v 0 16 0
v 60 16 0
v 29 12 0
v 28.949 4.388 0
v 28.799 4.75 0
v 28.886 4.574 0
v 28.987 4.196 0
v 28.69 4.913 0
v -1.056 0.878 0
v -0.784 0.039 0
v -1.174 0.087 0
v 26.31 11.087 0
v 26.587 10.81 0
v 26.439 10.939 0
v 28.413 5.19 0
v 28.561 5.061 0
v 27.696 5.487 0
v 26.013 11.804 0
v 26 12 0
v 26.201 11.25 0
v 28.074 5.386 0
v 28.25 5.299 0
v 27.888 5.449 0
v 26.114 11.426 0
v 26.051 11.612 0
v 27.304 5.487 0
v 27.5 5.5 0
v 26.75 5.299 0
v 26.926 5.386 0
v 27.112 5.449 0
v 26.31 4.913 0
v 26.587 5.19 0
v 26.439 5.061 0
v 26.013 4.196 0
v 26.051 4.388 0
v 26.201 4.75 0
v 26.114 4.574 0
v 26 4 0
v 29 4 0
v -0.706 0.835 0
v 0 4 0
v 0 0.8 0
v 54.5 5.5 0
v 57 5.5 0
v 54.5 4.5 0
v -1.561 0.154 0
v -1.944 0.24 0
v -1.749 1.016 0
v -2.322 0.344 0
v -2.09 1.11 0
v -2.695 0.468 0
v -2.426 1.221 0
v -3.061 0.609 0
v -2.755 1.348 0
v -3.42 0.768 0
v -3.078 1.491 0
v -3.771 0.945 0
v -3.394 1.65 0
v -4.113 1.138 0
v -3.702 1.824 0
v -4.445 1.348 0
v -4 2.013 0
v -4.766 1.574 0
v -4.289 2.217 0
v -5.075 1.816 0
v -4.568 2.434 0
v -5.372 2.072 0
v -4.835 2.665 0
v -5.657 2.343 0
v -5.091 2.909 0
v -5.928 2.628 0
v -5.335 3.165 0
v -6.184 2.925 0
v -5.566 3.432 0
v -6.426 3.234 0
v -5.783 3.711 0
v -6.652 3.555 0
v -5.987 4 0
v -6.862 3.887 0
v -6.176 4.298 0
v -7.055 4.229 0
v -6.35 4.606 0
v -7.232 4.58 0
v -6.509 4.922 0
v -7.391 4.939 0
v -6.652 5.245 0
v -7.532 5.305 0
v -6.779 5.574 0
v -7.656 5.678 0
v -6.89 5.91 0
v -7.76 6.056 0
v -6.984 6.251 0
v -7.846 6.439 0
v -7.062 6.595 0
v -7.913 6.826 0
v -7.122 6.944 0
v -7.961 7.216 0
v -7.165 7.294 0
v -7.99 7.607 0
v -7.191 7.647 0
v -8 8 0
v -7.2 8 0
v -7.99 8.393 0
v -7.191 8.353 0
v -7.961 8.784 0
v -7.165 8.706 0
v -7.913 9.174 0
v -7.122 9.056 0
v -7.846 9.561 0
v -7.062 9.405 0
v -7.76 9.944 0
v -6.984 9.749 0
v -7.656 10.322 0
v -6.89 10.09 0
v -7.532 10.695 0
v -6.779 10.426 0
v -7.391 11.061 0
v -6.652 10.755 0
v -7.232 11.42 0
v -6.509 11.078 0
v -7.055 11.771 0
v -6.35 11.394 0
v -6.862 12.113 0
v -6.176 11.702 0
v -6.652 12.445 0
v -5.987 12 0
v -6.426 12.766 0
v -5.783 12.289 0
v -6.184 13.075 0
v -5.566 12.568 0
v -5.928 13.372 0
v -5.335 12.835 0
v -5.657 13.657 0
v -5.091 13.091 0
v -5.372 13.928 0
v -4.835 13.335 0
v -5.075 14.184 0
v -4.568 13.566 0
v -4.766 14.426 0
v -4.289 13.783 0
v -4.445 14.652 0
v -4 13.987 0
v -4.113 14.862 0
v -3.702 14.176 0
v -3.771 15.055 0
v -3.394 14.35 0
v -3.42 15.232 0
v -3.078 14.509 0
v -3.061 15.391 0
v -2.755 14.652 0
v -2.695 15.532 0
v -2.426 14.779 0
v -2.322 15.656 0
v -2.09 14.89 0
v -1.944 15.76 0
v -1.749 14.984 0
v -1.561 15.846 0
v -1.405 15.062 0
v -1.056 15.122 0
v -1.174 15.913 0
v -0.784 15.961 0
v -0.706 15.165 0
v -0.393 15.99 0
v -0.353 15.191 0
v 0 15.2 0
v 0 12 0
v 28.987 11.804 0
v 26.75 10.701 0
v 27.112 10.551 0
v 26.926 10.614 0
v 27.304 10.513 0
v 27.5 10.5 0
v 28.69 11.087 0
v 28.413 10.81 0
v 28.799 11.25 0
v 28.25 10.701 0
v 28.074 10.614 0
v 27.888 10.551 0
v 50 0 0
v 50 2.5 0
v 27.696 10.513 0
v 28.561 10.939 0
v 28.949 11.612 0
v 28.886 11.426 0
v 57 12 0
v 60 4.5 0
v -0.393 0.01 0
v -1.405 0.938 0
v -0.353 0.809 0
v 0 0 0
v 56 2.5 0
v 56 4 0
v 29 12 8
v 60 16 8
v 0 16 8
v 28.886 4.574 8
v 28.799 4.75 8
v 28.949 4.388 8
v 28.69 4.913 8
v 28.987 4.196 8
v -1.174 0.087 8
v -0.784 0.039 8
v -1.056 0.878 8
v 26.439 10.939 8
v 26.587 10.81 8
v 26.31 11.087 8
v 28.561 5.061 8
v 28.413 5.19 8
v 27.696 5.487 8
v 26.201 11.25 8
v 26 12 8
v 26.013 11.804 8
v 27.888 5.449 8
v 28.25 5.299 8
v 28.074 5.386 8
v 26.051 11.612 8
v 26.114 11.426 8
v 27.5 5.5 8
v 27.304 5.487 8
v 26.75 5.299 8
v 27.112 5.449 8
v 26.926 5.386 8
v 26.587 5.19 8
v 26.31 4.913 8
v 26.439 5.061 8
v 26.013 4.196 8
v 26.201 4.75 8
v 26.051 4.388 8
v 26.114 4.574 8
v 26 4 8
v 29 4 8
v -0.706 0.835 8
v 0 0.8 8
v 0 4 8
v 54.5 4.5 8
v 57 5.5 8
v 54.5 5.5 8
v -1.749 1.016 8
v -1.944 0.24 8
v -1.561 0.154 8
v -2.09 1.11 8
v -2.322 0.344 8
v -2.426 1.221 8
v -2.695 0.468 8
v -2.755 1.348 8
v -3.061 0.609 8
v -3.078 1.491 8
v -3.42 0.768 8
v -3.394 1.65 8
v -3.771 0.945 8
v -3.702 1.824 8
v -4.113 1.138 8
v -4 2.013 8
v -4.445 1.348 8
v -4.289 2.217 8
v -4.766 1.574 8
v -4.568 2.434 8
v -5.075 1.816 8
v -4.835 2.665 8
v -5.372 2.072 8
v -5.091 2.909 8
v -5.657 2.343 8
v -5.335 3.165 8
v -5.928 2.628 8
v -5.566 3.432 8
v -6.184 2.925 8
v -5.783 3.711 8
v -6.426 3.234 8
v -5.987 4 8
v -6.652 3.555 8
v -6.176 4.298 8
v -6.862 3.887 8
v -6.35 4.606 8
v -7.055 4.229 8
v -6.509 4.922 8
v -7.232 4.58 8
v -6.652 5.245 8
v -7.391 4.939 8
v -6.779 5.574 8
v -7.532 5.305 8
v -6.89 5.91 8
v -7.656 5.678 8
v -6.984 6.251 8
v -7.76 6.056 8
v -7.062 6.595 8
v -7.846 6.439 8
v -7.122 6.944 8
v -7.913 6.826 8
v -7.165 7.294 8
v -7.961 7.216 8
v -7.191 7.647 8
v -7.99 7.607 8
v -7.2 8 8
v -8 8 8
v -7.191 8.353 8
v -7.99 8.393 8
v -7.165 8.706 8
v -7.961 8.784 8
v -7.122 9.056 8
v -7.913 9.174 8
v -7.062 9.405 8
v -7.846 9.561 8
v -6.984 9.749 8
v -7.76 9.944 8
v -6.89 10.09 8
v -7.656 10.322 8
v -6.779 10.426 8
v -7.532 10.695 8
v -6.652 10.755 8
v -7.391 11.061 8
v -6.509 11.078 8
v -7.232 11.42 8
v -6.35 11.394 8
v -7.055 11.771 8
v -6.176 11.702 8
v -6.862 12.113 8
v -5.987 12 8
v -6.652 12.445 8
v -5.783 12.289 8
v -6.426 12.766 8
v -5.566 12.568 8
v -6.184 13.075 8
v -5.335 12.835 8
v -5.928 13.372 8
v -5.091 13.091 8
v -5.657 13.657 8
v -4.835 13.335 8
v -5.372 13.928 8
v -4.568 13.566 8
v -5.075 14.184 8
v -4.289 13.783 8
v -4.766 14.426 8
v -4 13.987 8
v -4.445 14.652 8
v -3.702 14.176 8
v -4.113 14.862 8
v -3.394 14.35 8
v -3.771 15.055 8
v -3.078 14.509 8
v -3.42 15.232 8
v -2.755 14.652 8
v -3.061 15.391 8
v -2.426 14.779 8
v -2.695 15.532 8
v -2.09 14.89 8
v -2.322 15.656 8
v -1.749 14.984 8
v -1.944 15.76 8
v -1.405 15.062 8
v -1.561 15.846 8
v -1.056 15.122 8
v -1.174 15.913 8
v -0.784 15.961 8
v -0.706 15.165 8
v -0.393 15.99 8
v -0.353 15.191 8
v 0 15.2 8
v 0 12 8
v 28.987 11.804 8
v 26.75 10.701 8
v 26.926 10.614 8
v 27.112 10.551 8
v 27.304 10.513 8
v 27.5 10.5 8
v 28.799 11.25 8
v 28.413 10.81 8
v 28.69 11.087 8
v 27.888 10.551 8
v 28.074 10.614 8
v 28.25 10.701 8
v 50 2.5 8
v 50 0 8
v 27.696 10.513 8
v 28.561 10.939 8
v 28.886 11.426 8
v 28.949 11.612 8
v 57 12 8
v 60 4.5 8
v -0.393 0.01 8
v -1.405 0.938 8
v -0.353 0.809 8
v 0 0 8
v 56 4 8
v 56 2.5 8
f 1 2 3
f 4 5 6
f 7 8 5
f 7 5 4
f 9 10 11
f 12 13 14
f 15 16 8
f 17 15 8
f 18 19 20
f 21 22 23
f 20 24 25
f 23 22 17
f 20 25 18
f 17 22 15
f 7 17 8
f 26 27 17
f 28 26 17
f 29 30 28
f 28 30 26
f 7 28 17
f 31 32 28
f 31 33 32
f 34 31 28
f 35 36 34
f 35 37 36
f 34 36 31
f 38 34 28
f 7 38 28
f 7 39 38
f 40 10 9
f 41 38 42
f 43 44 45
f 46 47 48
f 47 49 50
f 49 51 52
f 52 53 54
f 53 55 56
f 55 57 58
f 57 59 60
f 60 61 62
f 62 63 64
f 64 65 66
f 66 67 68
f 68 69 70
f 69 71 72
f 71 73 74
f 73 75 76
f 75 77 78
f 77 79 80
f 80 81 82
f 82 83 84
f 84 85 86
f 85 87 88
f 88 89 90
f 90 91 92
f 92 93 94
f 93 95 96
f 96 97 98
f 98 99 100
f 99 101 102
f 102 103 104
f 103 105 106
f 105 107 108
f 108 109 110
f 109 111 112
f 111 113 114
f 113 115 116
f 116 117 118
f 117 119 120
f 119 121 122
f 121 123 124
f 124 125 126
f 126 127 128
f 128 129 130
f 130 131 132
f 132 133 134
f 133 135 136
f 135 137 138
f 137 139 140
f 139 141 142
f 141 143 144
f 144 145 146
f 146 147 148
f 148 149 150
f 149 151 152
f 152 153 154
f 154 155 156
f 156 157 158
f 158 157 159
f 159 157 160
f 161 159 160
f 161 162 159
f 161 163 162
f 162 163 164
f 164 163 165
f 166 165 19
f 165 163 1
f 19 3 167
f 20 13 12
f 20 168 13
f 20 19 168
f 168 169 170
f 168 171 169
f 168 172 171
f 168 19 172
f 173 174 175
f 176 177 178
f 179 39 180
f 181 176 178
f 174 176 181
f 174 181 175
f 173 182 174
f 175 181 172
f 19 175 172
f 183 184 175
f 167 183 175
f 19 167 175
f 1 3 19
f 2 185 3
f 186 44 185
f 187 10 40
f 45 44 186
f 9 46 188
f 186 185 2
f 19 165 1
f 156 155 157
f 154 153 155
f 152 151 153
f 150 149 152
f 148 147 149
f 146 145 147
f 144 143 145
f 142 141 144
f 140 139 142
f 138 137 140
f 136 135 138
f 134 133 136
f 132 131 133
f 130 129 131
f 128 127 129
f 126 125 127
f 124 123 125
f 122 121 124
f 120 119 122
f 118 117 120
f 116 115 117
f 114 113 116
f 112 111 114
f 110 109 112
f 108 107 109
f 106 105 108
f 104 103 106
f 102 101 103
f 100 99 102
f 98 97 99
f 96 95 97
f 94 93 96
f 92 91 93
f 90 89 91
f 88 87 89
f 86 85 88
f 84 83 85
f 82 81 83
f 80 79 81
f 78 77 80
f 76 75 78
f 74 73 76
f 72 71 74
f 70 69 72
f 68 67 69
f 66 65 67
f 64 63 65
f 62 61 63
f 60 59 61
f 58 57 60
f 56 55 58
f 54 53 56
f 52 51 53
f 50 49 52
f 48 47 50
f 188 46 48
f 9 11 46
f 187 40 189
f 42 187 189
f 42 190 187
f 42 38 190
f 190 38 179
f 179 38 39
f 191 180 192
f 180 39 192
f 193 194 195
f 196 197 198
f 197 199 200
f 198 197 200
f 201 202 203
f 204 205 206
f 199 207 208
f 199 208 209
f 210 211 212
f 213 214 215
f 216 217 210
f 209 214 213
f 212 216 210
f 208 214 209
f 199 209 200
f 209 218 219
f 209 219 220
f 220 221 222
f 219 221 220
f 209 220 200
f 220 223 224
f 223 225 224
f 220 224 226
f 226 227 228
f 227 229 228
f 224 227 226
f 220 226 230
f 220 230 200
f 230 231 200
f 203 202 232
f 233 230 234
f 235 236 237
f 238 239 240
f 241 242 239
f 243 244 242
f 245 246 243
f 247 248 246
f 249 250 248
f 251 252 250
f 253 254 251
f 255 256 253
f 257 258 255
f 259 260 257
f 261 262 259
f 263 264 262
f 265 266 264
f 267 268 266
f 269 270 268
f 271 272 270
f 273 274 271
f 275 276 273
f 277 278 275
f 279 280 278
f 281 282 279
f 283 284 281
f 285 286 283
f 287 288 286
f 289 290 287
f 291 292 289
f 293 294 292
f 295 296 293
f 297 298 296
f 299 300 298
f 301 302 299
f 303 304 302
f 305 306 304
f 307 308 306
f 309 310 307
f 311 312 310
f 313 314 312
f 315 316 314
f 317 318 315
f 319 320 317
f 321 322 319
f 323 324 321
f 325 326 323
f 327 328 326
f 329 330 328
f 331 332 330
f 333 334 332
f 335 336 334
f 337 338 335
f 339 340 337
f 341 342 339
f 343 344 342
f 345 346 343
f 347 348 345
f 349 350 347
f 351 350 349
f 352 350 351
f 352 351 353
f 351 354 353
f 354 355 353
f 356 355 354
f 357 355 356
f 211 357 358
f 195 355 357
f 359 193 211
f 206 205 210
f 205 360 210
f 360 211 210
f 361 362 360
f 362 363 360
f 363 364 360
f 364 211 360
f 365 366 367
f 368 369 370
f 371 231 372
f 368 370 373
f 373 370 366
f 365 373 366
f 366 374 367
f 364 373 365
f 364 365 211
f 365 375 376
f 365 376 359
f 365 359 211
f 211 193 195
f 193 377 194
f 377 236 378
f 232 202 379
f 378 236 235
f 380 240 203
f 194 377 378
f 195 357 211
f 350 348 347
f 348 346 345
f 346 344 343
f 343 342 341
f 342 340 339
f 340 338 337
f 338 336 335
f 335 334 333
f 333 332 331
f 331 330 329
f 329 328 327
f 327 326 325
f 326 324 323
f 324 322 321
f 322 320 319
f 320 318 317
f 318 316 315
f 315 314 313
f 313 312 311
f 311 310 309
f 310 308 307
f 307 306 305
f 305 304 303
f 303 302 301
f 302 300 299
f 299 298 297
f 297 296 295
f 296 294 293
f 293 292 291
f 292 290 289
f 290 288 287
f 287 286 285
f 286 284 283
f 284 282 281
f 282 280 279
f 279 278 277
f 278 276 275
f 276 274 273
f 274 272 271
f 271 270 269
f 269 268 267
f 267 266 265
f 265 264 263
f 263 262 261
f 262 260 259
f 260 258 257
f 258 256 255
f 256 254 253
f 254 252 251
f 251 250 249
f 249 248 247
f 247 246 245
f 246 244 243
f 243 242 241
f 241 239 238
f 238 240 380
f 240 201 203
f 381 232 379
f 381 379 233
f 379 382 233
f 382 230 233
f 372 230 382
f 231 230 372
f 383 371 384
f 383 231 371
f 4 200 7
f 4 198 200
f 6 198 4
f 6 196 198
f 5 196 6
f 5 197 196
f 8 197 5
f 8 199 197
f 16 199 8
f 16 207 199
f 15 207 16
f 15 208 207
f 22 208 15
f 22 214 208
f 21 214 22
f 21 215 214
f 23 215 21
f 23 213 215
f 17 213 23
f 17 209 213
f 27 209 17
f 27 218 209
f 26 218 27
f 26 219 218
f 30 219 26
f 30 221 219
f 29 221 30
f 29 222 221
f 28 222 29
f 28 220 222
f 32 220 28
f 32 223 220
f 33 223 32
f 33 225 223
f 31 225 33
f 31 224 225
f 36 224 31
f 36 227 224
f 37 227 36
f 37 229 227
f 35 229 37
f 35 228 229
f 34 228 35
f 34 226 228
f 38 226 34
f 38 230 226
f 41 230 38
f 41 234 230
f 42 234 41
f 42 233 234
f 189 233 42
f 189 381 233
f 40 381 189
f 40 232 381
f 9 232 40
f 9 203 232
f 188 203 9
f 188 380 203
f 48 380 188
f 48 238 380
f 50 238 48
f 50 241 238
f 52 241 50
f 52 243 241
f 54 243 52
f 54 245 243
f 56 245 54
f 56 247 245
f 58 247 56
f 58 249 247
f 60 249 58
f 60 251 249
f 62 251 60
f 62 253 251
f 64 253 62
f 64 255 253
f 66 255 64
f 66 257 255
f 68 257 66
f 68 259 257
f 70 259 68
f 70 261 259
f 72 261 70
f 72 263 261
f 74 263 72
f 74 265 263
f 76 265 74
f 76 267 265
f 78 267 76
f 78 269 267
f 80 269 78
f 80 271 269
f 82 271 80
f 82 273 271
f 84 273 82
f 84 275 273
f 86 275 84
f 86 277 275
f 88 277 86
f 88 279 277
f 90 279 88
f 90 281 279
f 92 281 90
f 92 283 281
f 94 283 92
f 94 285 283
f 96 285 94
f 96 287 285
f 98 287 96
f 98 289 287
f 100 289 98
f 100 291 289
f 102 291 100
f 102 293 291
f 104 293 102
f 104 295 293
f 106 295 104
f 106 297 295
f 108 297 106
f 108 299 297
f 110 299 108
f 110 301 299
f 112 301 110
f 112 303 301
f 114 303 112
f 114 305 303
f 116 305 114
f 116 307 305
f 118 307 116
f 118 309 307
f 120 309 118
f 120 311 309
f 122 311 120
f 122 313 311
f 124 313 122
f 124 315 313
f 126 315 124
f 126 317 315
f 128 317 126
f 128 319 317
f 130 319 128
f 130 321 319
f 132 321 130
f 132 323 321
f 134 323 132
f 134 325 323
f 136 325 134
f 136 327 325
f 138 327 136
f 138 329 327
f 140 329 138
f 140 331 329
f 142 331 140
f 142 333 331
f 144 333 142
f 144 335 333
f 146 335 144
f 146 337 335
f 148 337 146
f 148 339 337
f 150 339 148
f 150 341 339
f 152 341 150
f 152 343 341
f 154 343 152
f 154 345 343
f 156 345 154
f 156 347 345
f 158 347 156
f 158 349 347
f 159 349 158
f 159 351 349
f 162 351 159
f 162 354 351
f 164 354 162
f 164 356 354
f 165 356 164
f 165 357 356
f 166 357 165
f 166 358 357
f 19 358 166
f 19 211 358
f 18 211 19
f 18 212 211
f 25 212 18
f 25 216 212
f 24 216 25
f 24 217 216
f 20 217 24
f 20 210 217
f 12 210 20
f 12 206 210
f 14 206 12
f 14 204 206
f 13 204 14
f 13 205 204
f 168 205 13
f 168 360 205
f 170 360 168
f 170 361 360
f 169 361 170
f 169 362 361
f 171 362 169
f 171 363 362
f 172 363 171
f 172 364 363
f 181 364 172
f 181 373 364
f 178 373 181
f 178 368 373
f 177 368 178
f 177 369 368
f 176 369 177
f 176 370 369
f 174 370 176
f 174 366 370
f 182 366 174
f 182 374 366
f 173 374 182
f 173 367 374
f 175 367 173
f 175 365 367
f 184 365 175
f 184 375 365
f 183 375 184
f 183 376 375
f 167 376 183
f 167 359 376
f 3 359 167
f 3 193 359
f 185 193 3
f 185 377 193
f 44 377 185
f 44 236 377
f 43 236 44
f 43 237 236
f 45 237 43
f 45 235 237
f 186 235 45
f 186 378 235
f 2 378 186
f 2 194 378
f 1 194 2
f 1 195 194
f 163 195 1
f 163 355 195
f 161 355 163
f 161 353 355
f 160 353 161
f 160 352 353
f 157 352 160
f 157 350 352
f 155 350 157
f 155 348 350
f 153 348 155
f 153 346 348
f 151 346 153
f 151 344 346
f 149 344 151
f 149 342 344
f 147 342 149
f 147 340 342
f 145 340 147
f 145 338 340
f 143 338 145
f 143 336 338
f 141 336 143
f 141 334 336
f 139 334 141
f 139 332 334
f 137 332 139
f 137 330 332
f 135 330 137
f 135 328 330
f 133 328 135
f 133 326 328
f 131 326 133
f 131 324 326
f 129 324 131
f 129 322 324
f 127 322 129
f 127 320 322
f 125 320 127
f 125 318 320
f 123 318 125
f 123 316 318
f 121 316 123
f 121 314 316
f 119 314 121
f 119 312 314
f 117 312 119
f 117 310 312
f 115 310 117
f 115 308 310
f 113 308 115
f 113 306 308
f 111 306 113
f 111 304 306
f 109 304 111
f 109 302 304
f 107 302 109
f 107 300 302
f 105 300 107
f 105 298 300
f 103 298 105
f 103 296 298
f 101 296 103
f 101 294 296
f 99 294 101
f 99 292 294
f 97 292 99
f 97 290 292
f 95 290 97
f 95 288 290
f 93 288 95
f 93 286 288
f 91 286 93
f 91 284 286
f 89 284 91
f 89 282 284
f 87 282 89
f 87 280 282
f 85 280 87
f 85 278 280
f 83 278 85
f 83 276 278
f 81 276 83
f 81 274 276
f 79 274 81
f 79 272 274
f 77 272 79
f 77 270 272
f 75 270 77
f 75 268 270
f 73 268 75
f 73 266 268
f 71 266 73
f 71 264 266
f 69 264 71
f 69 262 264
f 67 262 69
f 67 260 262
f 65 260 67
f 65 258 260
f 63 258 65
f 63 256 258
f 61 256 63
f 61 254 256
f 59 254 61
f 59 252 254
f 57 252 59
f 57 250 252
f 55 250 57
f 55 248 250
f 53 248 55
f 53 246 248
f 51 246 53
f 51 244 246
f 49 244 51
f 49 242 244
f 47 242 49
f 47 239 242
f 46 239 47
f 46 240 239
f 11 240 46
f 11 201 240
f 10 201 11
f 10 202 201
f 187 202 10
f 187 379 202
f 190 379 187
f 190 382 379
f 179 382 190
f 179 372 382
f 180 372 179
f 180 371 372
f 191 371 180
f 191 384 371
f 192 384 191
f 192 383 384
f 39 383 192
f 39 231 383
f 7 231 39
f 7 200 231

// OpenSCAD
// Pinch clamp for silicone tubing (up to 6.4 mm OD) with a living hinge and a snap latch
// Category: quick fixes. One flat profile: two jaws joined by a 0.8 mm half-ring hinge, a
// half-round pinch ridge on each jaw, and a hook on the upper jaw whose nose snaps under the
// lower jaw's thin tongue when the jaws are squeezed together.
// Print: PETG or PP (PLA hinges crack), lying flat, 0.2 mm layers, 100 % infill.
// SPDX-License-Identifier: CERN-OHL-P-2.0

/* [Clamp] */
thickness = 8;            // extrusion along Z
lower_jaw = [50, 4];      // x 0..50, y 0..4
tongue = [50, 56, 2.5];   // x from, x to, y bottom (top at y = 4)
upper_jaw = [60, 12, 16]; // x 0..60, y 12..16
hinge_c = [0, 8];         // half-ring on the x < 0 side
hinge_r = [7.2, 8];       // inner, outer radius (0.8 mm thick)
ridge_x = 27.5;
ridge_r = 1.5;
leg = [57, 60, 4.5, 12];  // hook leg x from, x to, y from, y to
nose = [54.5, 57, 4.5, 5.5];

/* [Hidden] */
eps = 0.01;

linear_extrude(thickness) union() {
    square(lower_jaw);
    translate([tongue[0], tongue[2]]) square([tongue[1] - tongue[0], lower_jaw.y - tongue[2]]);
    translate([0, upper_jaw[1]]) square([upper_jaw[0], upper_jaw[2] - upper_jaw[1]]);
    intersection() {
        translate(hinge_c) difference() { circle(r = hinge_r[1], $fn = 128); circle(r = hinge_r[0], $fn = 128); }
        translate([-hinge_r[1] - 1, -1]) square([hinge_r[1] + 1 + eps, 2 * hinge_r[1] + 2]);
    }
    translate([ridge_x, lower_jaw.y]) circle(r = ridge_r, $fn = 48);
    translate([ridge_x, upper_jaw[1]]) circle(r = ridge_r, $fn = 48);
    translate([leg[0], leg[2]]) square([leg[1] - leg[0], leg[3] - leg[2] + eps]);
    translate([nose[0], nose[2]]) square([nose[1] - nose[0] + eps, nose[3] - nose[2]]);
}
